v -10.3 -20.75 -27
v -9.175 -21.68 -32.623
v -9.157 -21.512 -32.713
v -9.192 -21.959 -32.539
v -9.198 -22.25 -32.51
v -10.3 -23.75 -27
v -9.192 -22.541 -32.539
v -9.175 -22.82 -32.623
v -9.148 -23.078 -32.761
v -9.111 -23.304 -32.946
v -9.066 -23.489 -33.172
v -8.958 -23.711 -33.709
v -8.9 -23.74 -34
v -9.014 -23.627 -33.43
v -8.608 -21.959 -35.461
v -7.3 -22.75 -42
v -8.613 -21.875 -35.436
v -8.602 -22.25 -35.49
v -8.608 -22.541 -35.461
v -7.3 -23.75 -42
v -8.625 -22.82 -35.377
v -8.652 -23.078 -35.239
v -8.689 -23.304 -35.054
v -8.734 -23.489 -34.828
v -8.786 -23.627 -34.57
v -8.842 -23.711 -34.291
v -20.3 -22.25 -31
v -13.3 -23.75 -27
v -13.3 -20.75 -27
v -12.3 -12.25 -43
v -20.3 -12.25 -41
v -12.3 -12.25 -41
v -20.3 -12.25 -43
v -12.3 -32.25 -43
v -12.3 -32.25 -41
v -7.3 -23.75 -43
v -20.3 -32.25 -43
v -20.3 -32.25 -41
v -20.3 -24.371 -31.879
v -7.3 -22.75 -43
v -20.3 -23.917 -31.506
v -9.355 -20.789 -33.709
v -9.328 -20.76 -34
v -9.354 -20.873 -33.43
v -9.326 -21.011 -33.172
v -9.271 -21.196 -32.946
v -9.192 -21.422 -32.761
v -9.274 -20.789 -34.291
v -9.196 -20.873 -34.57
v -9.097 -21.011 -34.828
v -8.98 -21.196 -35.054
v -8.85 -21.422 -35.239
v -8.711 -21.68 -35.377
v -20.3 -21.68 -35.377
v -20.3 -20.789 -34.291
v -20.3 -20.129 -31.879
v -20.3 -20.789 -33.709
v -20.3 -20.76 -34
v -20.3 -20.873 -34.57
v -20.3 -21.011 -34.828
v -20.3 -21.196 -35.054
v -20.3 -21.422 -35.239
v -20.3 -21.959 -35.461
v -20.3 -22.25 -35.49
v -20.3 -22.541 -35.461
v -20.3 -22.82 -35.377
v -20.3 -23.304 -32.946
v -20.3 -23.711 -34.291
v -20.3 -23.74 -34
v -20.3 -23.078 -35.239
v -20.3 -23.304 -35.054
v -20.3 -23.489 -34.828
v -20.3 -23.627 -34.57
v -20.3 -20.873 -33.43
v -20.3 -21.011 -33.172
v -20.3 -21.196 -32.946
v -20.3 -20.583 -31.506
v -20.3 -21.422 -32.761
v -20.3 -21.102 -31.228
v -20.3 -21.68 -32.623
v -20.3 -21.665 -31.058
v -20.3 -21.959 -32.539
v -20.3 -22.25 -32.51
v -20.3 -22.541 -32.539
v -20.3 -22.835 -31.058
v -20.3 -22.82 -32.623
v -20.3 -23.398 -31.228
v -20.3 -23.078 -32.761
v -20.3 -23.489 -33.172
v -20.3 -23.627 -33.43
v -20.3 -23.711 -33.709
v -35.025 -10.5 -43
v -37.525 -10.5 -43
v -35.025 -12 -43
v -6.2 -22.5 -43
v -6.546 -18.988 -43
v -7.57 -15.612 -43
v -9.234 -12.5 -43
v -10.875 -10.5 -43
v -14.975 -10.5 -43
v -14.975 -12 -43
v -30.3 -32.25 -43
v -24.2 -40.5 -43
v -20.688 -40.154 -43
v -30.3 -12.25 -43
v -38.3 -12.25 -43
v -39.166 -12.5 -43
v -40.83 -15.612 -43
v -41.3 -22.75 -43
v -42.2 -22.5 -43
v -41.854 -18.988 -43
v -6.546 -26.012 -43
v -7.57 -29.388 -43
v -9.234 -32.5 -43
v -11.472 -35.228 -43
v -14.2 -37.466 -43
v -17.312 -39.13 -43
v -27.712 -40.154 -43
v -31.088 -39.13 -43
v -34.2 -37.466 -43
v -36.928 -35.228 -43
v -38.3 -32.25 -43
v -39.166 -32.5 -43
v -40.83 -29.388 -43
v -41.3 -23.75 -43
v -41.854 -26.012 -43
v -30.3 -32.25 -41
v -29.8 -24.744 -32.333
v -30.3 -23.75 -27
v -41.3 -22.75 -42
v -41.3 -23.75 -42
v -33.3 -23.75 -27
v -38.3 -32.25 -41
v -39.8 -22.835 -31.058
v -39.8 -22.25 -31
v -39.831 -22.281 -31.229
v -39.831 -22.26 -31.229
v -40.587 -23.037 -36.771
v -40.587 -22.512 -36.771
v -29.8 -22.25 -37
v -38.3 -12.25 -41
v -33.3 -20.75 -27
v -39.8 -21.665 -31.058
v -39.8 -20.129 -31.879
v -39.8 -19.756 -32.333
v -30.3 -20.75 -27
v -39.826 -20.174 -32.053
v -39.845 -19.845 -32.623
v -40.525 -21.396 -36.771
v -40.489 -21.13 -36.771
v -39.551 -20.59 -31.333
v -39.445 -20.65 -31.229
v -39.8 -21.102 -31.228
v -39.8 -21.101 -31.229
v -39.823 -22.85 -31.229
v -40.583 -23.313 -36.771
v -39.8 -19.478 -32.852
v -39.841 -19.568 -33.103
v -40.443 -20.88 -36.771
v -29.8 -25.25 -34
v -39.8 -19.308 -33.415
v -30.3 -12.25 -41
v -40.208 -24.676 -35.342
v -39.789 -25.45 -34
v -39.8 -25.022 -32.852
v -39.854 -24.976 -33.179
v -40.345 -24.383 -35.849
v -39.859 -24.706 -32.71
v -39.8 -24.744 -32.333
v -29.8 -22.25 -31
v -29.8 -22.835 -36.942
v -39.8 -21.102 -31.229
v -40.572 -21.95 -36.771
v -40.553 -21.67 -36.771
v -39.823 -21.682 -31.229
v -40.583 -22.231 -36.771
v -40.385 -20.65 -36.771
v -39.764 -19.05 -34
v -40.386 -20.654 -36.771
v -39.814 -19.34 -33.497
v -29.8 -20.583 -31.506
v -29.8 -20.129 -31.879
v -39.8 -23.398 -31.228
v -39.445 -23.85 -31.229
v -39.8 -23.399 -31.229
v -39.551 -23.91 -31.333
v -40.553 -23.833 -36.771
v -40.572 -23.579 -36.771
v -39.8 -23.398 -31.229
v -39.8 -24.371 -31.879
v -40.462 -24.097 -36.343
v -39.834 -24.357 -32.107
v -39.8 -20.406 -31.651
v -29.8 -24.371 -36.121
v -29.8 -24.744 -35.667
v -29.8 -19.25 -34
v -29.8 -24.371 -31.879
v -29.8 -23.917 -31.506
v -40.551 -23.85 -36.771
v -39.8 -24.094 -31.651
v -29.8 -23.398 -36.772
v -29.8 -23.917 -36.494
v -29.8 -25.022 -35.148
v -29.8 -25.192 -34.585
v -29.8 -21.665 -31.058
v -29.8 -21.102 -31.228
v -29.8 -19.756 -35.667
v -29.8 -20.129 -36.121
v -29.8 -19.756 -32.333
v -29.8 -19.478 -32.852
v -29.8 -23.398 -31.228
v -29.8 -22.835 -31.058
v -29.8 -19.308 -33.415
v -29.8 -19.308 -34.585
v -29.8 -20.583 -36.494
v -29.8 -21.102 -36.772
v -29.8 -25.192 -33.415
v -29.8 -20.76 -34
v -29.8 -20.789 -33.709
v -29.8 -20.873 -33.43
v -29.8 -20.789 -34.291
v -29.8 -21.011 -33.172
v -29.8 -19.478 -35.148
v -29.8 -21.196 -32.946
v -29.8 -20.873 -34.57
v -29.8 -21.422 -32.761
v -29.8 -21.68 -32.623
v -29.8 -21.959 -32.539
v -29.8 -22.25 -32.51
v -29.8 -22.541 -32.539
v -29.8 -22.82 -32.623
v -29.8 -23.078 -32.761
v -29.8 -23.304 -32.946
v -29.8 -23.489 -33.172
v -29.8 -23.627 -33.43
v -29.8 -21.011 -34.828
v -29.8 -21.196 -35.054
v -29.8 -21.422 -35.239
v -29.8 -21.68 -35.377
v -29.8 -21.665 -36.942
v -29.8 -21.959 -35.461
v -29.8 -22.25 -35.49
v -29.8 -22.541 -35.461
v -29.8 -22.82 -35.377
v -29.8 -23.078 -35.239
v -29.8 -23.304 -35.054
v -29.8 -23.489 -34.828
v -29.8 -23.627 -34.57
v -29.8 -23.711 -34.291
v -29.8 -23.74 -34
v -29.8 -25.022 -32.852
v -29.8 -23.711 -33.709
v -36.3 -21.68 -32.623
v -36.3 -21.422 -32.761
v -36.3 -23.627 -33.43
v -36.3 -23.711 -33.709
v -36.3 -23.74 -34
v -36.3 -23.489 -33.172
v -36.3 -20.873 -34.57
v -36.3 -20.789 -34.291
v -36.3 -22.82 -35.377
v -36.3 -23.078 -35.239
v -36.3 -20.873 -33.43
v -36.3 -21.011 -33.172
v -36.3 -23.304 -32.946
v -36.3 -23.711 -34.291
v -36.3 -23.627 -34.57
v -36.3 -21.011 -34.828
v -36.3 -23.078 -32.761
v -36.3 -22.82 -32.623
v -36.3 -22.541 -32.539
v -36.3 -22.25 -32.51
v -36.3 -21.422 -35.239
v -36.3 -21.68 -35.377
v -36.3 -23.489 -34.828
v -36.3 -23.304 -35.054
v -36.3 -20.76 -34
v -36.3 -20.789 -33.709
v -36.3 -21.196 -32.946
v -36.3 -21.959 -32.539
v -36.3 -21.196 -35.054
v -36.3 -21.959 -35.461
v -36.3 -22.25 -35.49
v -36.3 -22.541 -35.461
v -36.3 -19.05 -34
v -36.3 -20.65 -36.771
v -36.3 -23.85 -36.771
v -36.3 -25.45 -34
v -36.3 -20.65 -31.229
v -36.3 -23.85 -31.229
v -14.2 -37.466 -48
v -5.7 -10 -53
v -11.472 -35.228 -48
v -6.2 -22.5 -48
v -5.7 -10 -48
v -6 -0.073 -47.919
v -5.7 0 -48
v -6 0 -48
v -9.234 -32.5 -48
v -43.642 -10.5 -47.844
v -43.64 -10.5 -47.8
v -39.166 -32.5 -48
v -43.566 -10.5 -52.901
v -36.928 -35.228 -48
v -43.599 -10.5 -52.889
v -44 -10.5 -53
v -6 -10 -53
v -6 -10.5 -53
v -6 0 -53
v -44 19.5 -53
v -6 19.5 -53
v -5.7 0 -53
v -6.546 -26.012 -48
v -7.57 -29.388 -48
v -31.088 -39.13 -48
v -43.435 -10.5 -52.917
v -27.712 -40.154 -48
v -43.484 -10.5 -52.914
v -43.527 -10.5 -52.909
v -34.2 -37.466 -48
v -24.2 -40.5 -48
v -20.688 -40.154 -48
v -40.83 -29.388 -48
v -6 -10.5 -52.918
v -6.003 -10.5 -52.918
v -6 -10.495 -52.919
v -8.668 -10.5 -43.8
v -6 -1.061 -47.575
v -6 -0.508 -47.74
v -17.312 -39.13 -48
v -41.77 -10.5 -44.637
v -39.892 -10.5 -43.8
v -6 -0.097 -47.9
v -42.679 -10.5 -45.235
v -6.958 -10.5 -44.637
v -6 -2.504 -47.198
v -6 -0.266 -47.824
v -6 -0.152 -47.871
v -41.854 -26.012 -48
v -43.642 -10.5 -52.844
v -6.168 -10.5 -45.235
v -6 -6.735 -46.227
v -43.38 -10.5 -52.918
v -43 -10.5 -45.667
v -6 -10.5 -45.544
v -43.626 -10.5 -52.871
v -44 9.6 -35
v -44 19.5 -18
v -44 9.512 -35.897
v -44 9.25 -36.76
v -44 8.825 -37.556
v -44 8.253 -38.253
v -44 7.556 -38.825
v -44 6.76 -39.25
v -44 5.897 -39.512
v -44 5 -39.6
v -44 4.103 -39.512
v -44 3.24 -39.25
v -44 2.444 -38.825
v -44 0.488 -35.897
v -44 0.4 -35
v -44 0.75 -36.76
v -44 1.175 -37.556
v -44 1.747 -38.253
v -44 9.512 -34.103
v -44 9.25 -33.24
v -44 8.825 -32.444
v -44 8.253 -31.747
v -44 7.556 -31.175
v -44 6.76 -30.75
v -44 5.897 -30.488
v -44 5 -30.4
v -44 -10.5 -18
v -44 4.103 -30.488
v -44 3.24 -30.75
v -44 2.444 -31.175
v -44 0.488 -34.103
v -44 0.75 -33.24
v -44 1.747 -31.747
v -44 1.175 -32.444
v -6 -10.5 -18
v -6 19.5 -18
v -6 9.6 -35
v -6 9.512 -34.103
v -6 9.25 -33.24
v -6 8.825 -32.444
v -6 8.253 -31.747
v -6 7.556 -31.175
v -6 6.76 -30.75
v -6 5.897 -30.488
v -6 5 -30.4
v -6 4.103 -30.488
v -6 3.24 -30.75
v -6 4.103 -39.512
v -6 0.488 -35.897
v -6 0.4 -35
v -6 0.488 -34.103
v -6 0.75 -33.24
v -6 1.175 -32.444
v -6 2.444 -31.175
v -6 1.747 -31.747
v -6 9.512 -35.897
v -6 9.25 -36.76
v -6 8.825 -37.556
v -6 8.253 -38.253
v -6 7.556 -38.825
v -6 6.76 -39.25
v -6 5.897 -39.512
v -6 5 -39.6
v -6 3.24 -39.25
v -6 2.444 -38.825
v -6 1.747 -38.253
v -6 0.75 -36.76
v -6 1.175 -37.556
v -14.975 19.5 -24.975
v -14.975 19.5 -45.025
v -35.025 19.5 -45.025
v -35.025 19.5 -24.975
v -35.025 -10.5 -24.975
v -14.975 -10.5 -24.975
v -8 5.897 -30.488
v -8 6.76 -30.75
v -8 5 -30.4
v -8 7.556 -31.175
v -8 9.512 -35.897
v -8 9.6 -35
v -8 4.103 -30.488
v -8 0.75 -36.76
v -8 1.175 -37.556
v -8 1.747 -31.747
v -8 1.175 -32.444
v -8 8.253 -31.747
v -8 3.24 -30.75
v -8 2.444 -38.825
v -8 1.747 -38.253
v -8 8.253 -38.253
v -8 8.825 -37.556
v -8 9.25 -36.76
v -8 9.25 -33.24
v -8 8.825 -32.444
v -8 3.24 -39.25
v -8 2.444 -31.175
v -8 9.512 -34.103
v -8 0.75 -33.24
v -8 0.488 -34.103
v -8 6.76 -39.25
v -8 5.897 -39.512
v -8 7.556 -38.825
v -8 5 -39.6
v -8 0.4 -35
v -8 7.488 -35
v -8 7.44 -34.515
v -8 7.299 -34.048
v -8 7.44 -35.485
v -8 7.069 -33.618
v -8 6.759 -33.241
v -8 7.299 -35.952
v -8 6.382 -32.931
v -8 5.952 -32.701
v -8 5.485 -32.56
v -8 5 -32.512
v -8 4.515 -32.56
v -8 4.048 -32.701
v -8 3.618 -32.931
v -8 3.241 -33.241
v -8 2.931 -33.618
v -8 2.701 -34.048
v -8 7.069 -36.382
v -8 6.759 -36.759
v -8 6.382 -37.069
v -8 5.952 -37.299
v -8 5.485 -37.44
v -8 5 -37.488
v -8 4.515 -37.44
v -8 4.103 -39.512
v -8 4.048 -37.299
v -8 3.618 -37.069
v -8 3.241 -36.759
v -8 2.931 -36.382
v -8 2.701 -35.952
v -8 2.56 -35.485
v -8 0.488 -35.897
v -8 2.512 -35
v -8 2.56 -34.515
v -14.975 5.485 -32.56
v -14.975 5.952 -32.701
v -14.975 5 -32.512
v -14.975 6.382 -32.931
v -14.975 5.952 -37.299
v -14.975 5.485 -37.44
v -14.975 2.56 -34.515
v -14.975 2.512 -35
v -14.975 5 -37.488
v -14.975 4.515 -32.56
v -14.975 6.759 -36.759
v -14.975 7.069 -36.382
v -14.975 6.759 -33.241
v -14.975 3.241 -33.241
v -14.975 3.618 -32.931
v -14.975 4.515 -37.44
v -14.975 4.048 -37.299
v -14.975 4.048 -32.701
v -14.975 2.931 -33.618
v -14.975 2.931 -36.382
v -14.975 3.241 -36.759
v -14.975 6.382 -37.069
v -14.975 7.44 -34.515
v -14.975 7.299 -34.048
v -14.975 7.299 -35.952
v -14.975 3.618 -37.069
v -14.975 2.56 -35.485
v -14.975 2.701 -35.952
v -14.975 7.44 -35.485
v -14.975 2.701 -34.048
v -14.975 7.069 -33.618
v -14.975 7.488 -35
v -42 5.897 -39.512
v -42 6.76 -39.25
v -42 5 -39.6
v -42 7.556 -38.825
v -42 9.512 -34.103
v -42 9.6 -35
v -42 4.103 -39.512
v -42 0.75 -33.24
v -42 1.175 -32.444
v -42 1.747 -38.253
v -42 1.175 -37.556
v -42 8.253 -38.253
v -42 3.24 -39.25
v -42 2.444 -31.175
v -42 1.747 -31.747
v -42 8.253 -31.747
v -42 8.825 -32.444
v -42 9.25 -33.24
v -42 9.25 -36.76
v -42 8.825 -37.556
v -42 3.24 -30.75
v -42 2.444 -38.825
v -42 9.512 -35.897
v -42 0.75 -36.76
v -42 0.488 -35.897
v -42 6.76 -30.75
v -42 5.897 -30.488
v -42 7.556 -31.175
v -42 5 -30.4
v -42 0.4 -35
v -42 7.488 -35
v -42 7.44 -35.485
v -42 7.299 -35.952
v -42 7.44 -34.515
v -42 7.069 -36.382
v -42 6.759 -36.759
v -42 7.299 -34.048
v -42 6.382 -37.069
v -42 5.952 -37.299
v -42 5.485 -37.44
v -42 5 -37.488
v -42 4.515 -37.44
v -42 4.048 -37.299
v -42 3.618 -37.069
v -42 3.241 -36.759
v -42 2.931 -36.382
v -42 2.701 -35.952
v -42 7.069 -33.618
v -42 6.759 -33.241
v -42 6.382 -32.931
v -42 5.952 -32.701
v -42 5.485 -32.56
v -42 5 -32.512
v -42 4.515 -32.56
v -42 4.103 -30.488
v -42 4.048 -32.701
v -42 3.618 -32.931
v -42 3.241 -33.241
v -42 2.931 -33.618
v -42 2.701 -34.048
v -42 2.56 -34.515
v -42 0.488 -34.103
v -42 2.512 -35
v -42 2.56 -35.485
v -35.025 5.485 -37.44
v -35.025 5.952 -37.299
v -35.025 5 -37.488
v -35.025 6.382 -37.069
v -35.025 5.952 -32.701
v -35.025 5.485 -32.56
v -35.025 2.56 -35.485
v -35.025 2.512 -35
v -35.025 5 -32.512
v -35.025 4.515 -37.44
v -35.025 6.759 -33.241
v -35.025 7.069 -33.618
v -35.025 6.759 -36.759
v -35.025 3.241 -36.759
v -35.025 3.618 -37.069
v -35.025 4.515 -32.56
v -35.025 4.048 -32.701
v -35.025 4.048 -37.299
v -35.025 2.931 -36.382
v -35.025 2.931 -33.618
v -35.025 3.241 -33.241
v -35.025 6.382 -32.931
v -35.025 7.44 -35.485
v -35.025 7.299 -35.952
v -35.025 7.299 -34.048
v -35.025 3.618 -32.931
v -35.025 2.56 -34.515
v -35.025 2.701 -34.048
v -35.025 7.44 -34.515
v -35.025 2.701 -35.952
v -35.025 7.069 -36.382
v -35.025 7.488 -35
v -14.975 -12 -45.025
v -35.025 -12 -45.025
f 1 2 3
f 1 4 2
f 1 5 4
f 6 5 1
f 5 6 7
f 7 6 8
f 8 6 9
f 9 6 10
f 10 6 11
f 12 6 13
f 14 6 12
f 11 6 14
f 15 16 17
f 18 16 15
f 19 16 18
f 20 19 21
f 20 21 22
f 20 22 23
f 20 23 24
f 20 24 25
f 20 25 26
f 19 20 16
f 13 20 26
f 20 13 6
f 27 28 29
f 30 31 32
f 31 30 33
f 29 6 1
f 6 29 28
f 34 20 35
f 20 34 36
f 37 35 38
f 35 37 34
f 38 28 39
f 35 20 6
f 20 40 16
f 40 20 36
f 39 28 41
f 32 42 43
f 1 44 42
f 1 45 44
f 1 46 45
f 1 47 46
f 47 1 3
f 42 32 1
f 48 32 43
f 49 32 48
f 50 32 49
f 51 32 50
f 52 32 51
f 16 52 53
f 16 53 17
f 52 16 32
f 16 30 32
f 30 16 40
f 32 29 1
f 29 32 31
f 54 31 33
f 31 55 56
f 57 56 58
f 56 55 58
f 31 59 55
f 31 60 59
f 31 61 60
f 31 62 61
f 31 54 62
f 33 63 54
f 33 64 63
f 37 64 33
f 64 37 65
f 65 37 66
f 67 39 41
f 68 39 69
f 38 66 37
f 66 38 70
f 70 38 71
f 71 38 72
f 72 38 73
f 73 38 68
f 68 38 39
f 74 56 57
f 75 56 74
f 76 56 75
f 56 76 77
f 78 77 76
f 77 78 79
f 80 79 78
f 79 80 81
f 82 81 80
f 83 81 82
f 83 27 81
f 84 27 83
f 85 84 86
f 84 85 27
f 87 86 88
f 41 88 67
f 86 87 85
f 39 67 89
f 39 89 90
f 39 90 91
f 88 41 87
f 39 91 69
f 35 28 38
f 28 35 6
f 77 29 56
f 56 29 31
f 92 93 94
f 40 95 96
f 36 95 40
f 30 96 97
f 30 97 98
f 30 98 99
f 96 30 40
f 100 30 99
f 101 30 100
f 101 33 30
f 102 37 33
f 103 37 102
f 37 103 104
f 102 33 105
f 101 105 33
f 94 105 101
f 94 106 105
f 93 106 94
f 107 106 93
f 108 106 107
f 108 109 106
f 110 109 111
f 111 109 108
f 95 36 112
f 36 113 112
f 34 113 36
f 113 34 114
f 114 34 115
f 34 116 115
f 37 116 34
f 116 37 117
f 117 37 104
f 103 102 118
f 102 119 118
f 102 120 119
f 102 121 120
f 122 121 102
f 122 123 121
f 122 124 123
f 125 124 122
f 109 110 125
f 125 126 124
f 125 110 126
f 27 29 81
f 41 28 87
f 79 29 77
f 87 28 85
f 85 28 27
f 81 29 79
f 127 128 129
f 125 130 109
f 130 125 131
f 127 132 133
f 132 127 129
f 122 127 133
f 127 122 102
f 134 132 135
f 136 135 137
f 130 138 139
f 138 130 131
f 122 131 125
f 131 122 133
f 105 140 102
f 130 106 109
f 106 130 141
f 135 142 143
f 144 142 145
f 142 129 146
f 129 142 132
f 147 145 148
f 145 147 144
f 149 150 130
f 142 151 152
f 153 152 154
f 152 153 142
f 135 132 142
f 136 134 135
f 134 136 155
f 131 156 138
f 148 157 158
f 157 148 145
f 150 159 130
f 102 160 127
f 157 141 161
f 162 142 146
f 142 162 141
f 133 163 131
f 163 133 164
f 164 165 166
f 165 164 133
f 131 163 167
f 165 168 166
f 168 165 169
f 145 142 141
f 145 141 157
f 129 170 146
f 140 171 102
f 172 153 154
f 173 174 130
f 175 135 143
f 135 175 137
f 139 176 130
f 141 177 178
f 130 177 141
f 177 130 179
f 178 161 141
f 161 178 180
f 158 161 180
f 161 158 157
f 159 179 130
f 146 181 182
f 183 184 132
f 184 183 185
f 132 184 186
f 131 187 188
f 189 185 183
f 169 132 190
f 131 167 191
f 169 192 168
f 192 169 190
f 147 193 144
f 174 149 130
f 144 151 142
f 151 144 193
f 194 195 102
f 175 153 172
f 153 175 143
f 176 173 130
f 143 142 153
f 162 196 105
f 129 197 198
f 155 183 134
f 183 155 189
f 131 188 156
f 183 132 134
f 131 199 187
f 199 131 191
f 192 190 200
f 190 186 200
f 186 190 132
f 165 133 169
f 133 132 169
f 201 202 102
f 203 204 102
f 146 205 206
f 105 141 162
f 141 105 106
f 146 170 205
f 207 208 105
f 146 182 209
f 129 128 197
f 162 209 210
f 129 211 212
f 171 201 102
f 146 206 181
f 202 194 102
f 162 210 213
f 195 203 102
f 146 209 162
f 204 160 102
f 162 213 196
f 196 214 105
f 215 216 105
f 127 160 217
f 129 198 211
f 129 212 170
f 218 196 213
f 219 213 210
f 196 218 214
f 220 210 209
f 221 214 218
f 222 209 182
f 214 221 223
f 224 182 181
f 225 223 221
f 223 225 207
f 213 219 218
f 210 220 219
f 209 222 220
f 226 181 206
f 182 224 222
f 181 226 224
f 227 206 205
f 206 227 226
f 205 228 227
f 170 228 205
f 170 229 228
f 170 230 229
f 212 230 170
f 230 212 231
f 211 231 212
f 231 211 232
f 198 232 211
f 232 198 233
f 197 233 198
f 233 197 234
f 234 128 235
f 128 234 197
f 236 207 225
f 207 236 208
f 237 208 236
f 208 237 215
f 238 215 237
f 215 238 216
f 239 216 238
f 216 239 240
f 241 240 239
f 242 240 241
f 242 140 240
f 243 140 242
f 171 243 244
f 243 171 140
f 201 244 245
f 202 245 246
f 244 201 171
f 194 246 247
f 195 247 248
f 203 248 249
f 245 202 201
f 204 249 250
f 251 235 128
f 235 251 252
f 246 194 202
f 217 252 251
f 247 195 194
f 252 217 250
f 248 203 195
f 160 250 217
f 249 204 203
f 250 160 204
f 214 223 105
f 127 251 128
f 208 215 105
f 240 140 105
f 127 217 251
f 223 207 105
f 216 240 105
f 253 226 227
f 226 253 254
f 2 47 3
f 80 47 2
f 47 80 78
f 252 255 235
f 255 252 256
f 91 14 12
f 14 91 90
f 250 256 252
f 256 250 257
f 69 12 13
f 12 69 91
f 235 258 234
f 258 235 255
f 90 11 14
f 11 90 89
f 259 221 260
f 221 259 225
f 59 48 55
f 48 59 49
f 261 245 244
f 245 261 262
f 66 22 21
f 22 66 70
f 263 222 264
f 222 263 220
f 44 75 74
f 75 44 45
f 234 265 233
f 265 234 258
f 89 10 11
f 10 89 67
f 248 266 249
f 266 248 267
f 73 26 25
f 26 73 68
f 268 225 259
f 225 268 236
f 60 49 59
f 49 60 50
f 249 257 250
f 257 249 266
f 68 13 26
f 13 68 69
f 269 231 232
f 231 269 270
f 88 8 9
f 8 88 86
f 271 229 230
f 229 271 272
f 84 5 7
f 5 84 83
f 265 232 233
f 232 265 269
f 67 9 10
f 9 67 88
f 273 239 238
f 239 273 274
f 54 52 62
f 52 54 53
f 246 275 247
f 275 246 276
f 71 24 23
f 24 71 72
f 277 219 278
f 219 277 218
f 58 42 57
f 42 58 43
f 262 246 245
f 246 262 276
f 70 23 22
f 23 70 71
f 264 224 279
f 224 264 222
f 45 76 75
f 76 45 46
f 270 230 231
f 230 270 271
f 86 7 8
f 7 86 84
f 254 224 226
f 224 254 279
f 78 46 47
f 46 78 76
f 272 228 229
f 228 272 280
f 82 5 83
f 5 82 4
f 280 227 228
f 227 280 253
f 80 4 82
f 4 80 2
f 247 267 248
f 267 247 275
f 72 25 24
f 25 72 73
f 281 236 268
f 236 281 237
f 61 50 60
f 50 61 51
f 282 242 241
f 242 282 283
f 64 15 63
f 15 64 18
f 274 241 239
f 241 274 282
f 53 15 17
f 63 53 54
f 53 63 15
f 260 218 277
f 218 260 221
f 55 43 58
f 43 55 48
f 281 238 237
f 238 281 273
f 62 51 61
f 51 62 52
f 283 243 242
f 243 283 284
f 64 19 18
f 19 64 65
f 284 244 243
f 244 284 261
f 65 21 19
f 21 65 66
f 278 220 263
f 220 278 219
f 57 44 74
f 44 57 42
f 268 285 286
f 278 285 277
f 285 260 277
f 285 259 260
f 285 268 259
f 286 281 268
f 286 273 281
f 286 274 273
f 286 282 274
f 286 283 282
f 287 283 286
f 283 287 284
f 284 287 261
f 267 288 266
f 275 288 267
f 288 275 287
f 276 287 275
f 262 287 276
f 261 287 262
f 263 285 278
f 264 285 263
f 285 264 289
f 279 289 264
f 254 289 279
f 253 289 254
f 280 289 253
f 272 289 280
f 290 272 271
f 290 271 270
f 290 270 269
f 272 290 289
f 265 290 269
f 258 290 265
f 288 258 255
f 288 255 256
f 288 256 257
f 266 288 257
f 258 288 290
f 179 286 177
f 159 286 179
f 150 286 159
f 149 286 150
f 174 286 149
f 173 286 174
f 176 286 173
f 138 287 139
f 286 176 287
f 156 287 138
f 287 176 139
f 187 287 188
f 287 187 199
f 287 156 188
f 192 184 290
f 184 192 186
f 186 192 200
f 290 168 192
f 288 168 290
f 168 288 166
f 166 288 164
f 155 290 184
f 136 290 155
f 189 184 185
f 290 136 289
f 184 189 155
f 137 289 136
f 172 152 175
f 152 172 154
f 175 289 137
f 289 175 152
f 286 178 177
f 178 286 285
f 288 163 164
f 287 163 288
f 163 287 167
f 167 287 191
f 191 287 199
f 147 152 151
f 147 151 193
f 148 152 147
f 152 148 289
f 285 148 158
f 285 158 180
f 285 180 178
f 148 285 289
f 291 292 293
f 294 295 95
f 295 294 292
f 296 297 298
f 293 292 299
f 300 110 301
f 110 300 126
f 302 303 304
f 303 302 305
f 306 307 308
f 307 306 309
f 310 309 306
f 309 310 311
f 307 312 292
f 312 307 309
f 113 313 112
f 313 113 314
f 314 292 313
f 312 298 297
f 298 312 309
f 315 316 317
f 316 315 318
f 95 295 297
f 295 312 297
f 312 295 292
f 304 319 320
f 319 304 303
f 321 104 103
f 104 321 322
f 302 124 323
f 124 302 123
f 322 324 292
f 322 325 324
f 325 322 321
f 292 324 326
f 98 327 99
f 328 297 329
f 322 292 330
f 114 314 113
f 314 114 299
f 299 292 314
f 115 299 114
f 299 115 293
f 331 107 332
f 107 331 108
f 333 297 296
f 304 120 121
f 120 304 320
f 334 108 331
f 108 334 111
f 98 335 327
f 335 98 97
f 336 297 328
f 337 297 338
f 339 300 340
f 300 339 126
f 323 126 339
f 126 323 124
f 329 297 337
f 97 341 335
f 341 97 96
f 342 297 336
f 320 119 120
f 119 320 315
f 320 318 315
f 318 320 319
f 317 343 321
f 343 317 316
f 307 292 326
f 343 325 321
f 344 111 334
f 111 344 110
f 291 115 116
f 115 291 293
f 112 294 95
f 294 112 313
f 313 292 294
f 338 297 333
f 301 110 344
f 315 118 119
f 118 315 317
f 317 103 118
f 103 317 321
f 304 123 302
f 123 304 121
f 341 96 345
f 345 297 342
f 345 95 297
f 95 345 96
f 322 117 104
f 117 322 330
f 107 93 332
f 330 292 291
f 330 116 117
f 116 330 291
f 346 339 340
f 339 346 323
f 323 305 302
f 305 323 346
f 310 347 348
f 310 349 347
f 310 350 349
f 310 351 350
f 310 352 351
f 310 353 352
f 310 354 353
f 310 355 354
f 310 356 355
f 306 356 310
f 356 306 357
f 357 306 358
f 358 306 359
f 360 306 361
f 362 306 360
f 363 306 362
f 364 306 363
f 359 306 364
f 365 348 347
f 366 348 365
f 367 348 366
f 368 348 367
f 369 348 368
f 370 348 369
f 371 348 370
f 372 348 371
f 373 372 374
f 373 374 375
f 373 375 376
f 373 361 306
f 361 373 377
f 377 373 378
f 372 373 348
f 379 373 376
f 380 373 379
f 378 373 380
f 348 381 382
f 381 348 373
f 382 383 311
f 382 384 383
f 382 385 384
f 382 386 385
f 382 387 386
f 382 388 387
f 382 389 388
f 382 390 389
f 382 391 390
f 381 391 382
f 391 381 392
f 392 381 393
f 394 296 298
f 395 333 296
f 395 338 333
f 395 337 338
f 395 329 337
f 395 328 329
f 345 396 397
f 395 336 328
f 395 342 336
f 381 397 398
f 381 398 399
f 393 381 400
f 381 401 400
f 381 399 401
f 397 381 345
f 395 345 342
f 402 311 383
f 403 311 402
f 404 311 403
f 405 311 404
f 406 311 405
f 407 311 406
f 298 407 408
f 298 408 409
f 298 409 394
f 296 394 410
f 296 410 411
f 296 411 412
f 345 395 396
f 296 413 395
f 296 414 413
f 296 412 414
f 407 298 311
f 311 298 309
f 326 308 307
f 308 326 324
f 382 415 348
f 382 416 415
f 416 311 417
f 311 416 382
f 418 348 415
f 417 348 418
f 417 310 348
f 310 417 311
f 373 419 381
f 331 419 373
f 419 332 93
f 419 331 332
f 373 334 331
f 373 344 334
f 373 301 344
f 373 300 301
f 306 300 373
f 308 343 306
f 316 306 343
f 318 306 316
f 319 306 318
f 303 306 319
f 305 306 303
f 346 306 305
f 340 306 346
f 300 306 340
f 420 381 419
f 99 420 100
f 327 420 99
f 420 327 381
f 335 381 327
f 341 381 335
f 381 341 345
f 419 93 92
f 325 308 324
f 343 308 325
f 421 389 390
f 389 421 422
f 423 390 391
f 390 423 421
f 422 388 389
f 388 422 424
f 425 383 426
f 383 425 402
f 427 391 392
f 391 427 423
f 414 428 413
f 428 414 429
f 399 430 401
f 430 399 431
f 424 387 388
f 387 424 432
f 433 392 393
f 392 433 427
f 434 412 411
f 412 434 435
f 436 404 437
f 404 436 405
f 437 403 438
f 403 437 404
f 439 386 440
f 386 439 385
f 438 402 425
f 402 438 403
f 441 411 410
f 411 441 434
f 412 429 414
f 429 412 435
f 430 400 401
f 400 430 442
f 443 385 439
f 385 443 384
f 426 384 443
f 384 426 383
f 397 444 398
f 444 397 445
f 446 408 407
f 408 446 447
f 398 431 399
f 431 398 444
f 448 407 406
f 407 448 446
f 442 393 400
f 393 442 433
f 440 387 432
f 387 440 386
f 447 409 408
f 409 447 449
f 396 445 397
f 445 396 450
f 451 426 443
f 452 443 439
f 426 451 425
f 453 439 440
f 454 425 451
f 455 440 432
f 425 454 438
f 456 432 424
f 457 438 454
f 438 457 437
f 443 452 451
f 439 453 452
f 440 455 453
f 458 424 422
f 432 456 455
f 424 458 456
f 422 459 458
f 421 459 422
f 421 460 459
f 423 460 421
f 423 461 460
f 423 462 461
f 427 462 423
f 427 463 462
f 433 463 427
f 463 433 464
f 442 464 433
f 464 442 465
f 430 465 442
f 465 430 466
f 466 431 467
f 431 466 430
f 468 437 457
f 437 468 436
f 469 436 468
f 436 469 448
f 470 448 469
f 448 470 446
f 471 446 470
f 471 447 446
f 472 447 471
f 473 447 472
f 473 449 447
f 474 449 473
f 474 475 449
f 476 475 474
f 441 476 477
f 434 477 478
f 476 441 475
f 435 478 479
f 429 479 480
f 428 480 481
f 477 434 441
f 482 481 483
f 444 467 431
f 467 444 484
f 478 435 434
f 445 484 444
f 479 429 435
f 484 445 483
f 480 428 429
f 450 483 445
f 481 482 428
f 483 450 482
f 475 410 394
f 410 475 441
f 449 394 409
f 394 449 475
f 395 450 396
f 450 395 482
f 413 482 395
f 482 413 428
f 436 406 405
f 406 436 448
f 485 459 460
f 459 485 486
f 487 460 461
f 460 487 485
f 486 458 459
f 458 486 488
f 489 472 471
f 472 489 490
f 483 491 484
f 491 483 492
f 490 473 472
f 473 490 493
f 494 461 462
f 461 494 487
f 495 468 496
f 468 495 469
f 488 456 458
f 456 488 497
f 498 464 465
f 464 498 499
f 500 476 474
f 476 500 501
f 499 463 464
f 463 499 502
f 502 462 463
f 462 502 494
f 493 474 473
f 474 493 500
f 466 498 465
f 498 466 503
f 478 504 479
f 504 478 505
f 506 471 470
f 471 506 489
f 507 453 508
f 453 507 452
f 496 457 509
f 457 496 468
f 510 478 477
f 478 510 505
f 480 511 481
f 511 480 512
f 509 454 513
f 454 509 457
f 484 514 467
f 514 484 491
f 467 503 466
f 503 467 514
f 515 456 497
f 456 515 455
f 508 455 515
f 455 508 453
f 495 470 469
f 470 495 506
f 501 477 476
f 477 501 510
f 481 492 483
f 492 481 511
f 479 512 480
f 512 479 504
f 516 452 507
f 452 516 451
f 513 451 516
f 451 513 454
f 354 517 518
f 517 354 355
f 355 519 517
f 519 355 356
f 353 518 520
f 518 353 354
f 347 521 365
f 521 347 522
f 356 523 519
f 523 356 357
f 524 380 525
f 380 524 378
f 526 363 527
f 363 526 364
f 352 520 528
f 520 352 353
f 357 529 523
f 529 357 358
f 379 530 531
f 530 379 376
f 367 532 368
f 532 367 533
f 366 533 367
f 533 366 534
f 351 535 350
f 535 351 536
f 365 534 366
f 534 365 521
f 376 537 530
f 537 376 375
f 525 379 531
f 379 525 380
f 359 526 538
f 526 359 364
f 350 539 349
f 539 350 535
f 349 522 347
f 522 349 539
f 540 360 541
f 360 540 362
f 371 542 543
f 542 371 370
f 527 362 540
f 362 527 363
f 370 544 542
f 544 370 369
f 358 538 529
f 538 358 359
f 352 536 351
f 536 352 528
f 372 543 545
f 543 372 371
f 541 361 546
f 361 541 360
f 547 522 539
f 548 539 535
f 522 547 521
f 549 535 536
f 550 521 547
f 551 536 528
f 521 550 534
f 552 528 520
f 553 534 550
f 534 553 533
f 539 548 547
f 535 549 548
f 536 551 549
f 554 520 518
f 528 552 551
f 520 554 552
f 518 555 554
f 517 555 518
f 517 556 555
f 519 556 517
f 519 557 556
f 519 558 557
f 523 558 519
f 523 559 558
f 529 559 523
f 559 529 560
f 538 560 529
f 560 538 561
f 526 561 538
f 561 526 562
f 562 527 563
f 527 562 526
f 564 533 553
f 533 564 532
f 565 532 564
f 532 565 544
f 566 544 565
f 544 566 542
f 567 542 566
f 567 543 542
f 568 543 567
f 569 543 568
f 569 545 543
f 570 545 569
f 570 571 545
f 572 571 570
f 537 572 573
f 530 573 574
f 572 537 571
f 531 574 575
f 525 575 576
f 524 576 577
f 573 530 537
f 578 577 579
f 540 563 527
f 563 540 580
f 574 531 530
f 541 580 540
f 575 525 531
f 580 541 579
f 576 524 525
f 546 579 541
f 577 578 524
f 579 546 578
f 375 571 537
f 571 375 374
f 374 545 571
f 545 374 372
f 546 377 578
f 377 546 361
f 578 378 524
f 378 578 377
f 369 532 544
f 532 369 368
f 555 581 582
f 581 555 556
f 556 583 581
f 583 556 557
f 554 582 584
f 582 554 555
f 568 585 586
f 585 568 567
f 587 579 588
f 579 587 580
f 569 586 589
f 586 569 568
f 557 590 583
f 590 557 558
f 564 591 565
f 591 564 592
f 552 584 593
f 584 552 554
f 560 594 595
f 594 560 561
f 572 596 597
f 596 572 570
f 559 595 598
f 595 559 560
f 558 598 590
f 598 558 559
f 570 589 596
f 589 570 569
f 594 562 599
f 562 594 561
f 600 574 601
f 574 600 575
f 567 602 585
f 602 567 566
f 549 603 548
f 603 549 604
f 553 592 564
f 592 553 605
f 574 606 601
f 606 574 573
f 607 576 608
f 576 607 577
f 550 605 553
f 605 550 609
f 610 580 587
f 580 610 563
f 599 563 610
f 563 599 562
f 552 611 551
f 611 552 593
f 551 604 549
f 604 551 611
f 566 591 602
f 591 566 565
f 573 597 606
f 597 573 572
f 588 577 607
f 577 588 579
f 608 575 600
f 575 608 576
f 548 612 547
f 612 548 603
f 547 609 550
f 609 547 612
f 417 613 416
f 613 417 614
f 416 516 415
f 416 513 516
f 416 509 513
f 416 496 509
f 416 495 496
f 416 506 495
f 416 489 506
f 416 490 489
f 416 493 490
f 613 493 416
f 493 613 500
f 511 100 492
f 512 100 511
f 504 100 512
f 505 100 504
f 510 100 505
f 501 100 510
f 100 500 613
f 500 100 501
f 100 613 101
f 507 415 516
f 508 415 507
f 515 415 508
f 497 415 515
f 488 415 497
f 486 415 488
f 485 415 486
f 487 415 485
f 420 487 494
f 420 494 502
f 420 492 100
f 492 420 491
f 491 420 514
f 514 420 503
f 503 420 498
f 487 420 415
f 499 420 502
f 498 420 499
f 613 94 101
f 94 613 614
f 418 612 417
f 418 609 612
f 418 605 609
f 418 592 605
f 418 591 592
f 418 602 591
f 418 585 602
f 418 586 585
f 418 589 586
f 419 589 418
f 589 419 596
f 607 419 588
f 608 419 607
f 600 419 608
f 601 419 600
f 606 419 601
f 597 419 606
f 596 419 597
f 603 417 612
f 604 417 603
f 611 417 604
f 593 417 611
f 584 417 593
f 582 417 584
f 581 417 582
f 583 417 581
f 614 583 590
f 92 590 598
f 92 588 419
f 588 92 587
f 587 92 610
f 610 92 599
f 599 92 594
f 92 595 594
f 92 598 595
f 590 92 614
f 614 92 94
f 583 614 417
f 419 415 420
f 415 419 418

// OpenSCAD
// file: MCAD/constants.scad
// MIT license


TAU = 6.2831853071; //2*PI, see http://tauday.com/
PI = TAU/2;

// translates a imperial measurement in inches to meters
mm_per_inch = 25.4;
// file: MCAD/math.scad
// MIT license

include <constants.scad>

function deg(angle) = 360*angle/TAU;
// file: MCAD/motors.scad
// Copyright 2010 D1plo1d

// This library is dual licensed under the GPL 3.0 and the GNU Lesser General Public License as per http://creativecommons.org/licenses/LGPL/2.1/ .

include <math.scad>


//generates a motor mount for the specified nema standard #.
module stepper_motor_mount(nema_standard,slide_distance=0, mochup=true, tolerance=0) {
	//dimensions from:
	// http://www.numberfactory.com/NEMA%20Motor%20Dimensions.htm
	if (nema_standard == 17)
	{
		_stepper_motor_mount(
			motor_shaft_diameter = 0.1968*mm_per_inch,
			motor_shaft_length = 0.945*mm_per_inch,
			pilot_diameter = 0.866*mm_per_inch,
			pilot_length = 0.80*mm_per_inch,
			mounting_bolt_circle = 1.725*mm_per_inch,
			bolt_hole_size = 3.5,
			bolt_hole_distance = 1.220*mm_per_inch,
			slide_distance = slide_distance,
			mochup = mochup,
			tolerance=tolerance);
	}
	if (nema_standard == 23)
	{
		_stepper_motor_mount(
			motor_shaft_diameter = 0.250*mm_per_inch,
			motor_shaft_length = 0.81*mm_per_inch,
			pilot_diameter = 1.500*mm_per_inch,
			pilot_length = 0.062*mm_per_inch,
			mounting_bolt_circle = 2.625*mm_per_inch,
			bolt_hole_size = 0.195*mm_per_inch,
			bolt_hole_distance = 1.856*mm_per_inch,
			slide_distance = slide_distance,
			mochup = mochup,
			tolerance=tolerance);
	}
	
}


//inner mehod for creating a stepper motor mount of any dimensions
module _stepper_motor_mount(
	motor_shaft_diameter,
	motor_shaft_length,
	pilot_diameter,
	pilot_length,
	mounting_bolt_circle,
	bolt_hole_size,
	bolt_hole_distance,
	slide_distance = 0,
	motor_length = 40, //arbitray - not standardized
	mochup,
	tolerance = 0
)
{
	union()
	{
	// == centered mount points ==
	//mounting circle inset
	translate([0,slide_distance/2,0]) circle(r = pilot_diameter/2 + tolerance);
	square([pilot_diameter,slide_distance],center=true);
	translate([0,-slide_distance/2,0]) circle(r = pilot_diameter/2 + tolerance);

	//todo: motor shaft hole
	
	//mounting screw holes
	for (x = [-1,1])
	{
		for (y = [-1,1])
		{
			translate([x*bolt_hole_distance/2,y*bolt_hole_distance/2,0])
			{
				translate([0,slide_distance/2,0]) circle(bolt_hole_size/2 + tolerance);
				translate([0,-slide_distance/2,0]) circle(bolt_hole_size/2 + tolerance);
				square([bolt_hole_size+2*tolerance,slide_distance],center=true);
			}
		}
	}
	// == motor mock-up ==
	//motor box
	if (mochup == true)
	{
		%translate([0,0,-5]) cylinder(h = 5, r = pilot_diameter/2);
		%translate(v=[0,0,-motor_length/2])
		{
			cube(size=[bolt_hole_distance+bolt_hole_size+5,bolt_hole_distance+bolt_hole_size+5,motor_length], center = true);
		}
		//shaft
		%translate(v=[0,0,-(motor_length-motor_shaft_length-2)/2])
		{
			%cylinder(r=motor_shaft_diameter/2,h=motor_length+motor_shaft_length--1, center = true);
		}
	}
	}
}
// file: triangle.scad
//Copyright Austin Floyd 2013
//http://www.thingiverse.com/thing:119050
//license GNU GPL
//austin.floyd at 3DprintGeeks (dot) com

//global variables.. if not set when calling wedge it will use these values. 
//The prefix st_ is to "namespace" the global variables so they're not accidentally overridden elsewhere


//The top angle of the right triangle
st_wedgeAngle=12; // [0.01:89.99]

//The height of the triangle (width auto-generated based on this)
st_wedgeHeight=27; // [0.01:200]

//Depth (thickness) of triangle
st_wedgeWidth=2.2; // [0.01:200]

//Increased or decreased percentage (50% would be 0.5) of top point vs bottom point
st_topFactor=0.5; // [0,0.1,0.2,0.3,0.4,0.5,0.6,0.7,0.8,0.9,1]

//Whether or not to center on x/y/z
st_center=false; // [true, false]

//Flip it upside down
st_invert=false; // [true, false]

//default wedge
//wedge();

//demo of several different wedges
demo();

module demo() {
	translate([0,0,15])
	wedge(angle=75,height=10, wedgeWidth=5);

	wedge(angle=75,height=5,topFactor=.25, center=true, wedgeWidth=10);

	translate([0,0,-15])
	wedge(angle=35,height=13,center=true);

	translate([0,0,-30])
	wedge(angle=35,height=6, center=true, invert=true);
}


module wedge(angle=st_wedgeAngle, height=st_wedgeHeight, wedgeWidth=st_wedgeWidth, topFactor=st_topFactor, center=st_center, invert=st_invert) {
	angle2=180-90-angle;
	hyp=height/sin(angle2);
	width=sqrt(pow(hyp,2)-pow(height,2));
	if (!invert) {
		triangle(height, width, center, topFactor, wedgeWidth);
	}
	if (invert) {
		rotate(180,[1,0,0])
		triangle(height, width, center, topFactor, wedgeWidth);
	}
}
module triangle(height=5, width=5, center=false, topFactor=0.5, wedgeWidth) {
	triangles=[[0,1,4],[5,4,1],		// top
					[1,2,5],[2,3,4],		// sides
					[3,0,4], [4,5,2],	//back
           	[2,1,0], [2,0,3]]; // base
	halfWidth=width/2;
	halfWWidth=wedgeWidth/2;
	topWidth=wedgeWidth*topFactor;
	halfTopWidth=topWidth/2;
	topHalfDiff=(wedgeWidth-topWidth)/2;
	halfHeight=height/2;
	if (center) {
		polyhedron(
  			points=[/*0*/[halfWidth,halfWWidth,-halfHeight],/*1*/[halfWidth,-halfWWidth,-halfHeight],				//front point
					  /*2*/[-halfWidth,-halfWWidth,-halfHeight],       /*3*/[-halfWidth,halfWWidth,-halfHeight], //rear point
           	  /*4*/[-halfWidth,halfTopWidth,height-halfHeight], /*5*/[-halfWidth,-halfTopWidth,height-halfHeight] ], //front/rear top 
  			triangles=triangles
		);
	}
	else {
		polyhedron(
  			points=[/*0*/[width,wedgeWidth,0],         			 /*1*/[width,0,0],				    ////front point
					  /*2*/[0,0,0],       					  			 /*3*/[0,wedgeWidth,0], 		    //rear point
           	  /*4*/[0,wedgeWidth-topHalfDiff,height],/*5*/[0,topHalfDiff,height] ],//front/back top 
  			triangles=triangles
		);
	}
}
// file: pulley.scad
use <MCAD/nuts_and_bolts.scad>;

module pulley_wall(xside)
{
    hull(){
       translate([0,0,0]) cube([20,8,2]);
       
       if (xside==0){
          translate([8.5,0,14]) cube([3,3,2]);
          translate([8.5,10,0]) cube([1,1,1]);
          translate([10,9.5,9]) rotate([90,0,0]) cylinder(r=3,h=10);
          
         } else {
          translate([8.5,-2,14]) cube([3,3,2]);
          translate([8.5,-5,0]) cube([1,1,1]);
          translate([10,8,9]) rotate([90,0,0]) cylinder(r=3,h=10);
         }
       }
    
}

module pulley_body()
{
    translate([0,4,0])   pulley_wall(1);
    translate([0,22,0])  pulley_wall(0);
    %translate([10,2.2,9]) rotate([90,0,180]) boltHole(3,length=45);
    %translate([10,27,9]) rotate([90,0,180]) nutHole(3); 
}

module pulley_cuts()
{
    translate([10,-2,9]) rotate([90,0,180]) boltHole(3,length=45);
    translate([10,28,9]) rotate([90,0,180]) nutHole(3);  
    translate([10,30,9]) rotate([90,0,180]) nutHole(3); 
}

module pulley()
{
	difference(){
        translate([23,21,-12]) rotate([90,0,270]) pulley_body();
        translate([23,21,-12]) rotate([90,0,270]) pulley_cuts();
        }
    

}



pulley();
// file: sensor.scad
module sensor_mount_body()
{
 union() { 
      translate([44,2,0]) rotate([90,0,0]) cube([10,15,4]); 
      translate([44,18,0]) rotate([90,0,0]) cube([10,15,4]);
      
      translate([50,-2,0]) rotate([90,0,90]) cube([20,15,4]);
    //  translate([0,-2,0]) rotate([90,0,90]) cube([20,15,4]);
      
      
      }
}

module sensor_mount_cuts()
{

      translate([50,7.5,7.5]) rotate([90, 0, 90]) cylinder(r=2.5, h=10, center=true, $fn=12);

}

module sensor_mount()
{
   difference() {
    sensor_mount_body();
    sensor_mount_cuts();
    
     
     }
}

sensor_mount();
// file: nemamount.scad
include <MCAD/units.scad>;
include <MCAD/materials.scad>
include <MCAD/stepper.scad>
include <MCAD/motors.scad>
use <MCAD/shapes.scad>;
use <pulley.scad>;
$fn = 32;




module motor_support(ht)
{
   difference(){
	  translate([-22.5,23.5,0]) rotate([90,0,0]) motor_support_body(ht);
      translate([0,1,0]) rotate([90,0,0]) motor_support_cuts(ht);
      }
}

module motor_support_body(ht)
{
	cube([45,ht,48.5]);

}


module motor_support_cuts(ht)
{
// Motor shaft/pulley cutout.
      translate([0,.1,0]) rotate([90, 0, 0]) cylinder(r=12, h=ht*2, center=true, $fn=60);
      // NEMA 17 stepper motor mounting screws.
      for (x = [-1, 1]) for (z = [-1, 1]) {
        scale([x, 1, z]) translate([15.5, .1, 15.5]) {
          rotate([90, 0, 0]) cylinder(r=4, h=ht*2, center=true, $fn=12);
          }
        }
}



module nema_geared_cutout()
{
    //pulley opening
    translate([16,1,21]) rotate([90,0,0]){
      cylinder (h=22, r=6.6);

      rotate([0,0,45]) {
        translate([14,0,0]) cylinder(h=22, r=1.6, $fn=12);
        translate([0,14,0]) cylinder(h=22, r=1.6, $fn=12);
        translate([-14,0,0]) cylinder(h=22, r=1.6, $fn=12);
        translate([0,-14,0]) cylinder(h=22, r=1.6, $fn=12);
      }
     
    }

    //gearhead indentation
    translate([16,-5,21]) rotate([90,0,0]) cylinder (h=3.35, r=11.25);

  
    
}

module nema_cutout()
{
// Motor shaft/pulley cutout.
      rotate([90, 0, 0]) cylinder(r=12, h=20, center=true, $fn=60);
      // NEMA 17 stepper motor mounting screws.
      for (x = [-1, 1]) for (z = [-1, 1]) {
        scale([x, 1, z]) translate([15.5, -5, 15.5]) {
          rotate([90, 0, 0]) cylinder(r=1.65, h=20, center=true, $fn=12);
          }
        }
}

module nema_motor()
{
   union(){
     nema_mount();
     %translate([0,-4,1]) rotate([90,0,0]) motor(Nema17, size=NemaLong , dualAxis=false);
     }
}

module nema_motor_inverse()
{
   union(){
     nema_mount_inverse();
     %translate([0,-4,1]) rotate([90,0,0]) motor(Nema17, size=NemaLong , dualAxis=false);
     }
}

module nema_geared_motor_inverse()
{
   union(){
     nema_geared_inverse();
     %translate([16,-7,22]) rotate([90,0,180]) motor(Nema17, NemaLong, dualAxis=false);
    
     }
}

module nema_geared_motor()
{
   union(){
     nema_geared_mount();
     %translate([16,-7,22]) rotate([90,0,180]) motor(Nema17, NemaLong, dualAxis=false);
    
     }
}

module nema_geared_mount()
{
   difference(){
      union(){
           translate([-6,-6,0]) rotate([90,0,0]) cube([45,45,7]);
           rotate([180,0,0]) translate([-6,6,-4]) cube([45,15,5]);
           rotate([180,0,0]) translate([-6,6,-44])  cube([45,15,5]);
           }
      translate([0,0,1]) nema_geared_cutout();
      }
}

module nema_geared_inverse()
{
   difference(){
      union(){
           translate([-6,-6,0]) rotate([90,0,0]) cube([45,45,7]);
           translate([-6,-31,-4]) rotate([0,0,0]) cube([45,25,5]);
           translate([-6,-31,44]) rotate([0,0,0]) cube([45,25,5]);
           }
      translate([0,0,1]) nema_geared_cutout();
      }


}

module nema_mount_inverse()
{
   difference(){
      union(){
        translate([-22.5,0,-21.5]) rotate([90,0,0]) cube([45,45,5]);
        translate([-22.5,-5,-25]) rotate([0,0,0]) cube([45,25,5]);
        }
      translate([0,0,1]) nema_cutout();
      }
   //nema_cutout();
}

module nema_mount()
{
   difference(){
      union(){
        translate([-22.5,0,-21.5]) rotate([90,0,0]) cube([45,45,5]);
        rotate([180,0,0]) translate([-22.5,-10,-28]) cube([45,15,5]);
        }
      translate([0,0,1]) nema_cutout();
      }
   //nema_cutout();
}

module pulley_mount()
{
      hull(){
        translate([-22.5,0,-21.5+3]) rotate([90,0,0]) cube([10,38,5]);
	translate([0,5,0]) rotate([90,0,0]) cylinder(r=18,h=5);
      }
	translate([-11.25,28,-3.9]) rotate([0,0,-90]) pulley();
          
}

//nema_motor();
//nema_motor_inverse();
//translate([0,0,40]) rotate([270,0,0]) pulley_mount();
//translate([0,0,0]) motor_support(40);
//nema_geared_motor();
//nema_geared_motor_inverse();
pulley_mount();
// file: vslot.scad
include <MCAD/units.scad>;
include <MCAD/materials.scad>
use <MCAD/shapes.scad>;
use <bom.scad>;

vslot_color_black = [0.27, 0.27, 0.3];
vslot_color = Aluminum;

module vslot(length=50, sections=1, finish, cutout=0) {
	size = sections * 20;
	bom(str("vslot20x", size, "x", length), str("v-slot 20x", size, " (", length , "mm)"), ["rail", "extrusion", "structure"]);
	cutext = [[12.00,4.50],[10.00,4.50],[8.20,2.78],[8.20,5.50],[6.56,5.50],[3.90,2.84],[3.90,0.21],[3.69,0.00],[3.90,-0.21],[3.90,-2.84],[6.56,-5.50],[8.20,-5.50],[8.20,-2.78],[10.00,-4.50],[12.00,-4.50]];
	cutint = [[16.10,0.21],[16.10,2.84],[12.70,6.24],[12.70,8.78],[7.30,8.78],[7.30,6.24],[3.90,2.84],[3.90,0.21],[3.69,0.00],[3.90,-0.21],[3.90,-2.84],[7.30,-6.24],[7.30,-8.78],[12.70,-8.78],[12.70,-6.24],[16.10,-2.84],[16.10,-0.21],[16.31,0.00],];
	cutcorner = [[8.20,8.20],[6.57,8.20],[6.57,7.66],[7.66,6.57],[8.20,6.57]];

	module profile() {
        
		difference() {
         
			translate([0,0,length/2])
			roundedBox(20 * sections, 20, length, 1.5);
         if (cutout == 0){
			for(i = [0,180]) rotate([0,0,-i]) translate([10 * (sections - 1), 0, -epsilon/2]) {
				linear_extrude(length+20) polygon(cutext);
				translate([5,-2.89,-20]) cube([10,5.78,length+40]);
			}
          
			for(i = [90,270]) rotate([0,0,-i])
				for(j = [0:sections-1]) translate([0, (sections - 1) * 10 - 20 * j, -epsilon/2]) {
					linear_extrude(length+epsilon) polygon(cutext);
					translate([5,-2.89,-20]) cube([10,5.78,length+40]);
				}

			for(i = [0:sections-1]) translate([i * 20 - 10 * (sections - 1),0,-epsilon/2])
				cylinder(length+20, 2.1, 2.1);

			for(i = [90,270]) rotate([0,0,-i])
				translate([0,(sections - 1) * 10,-epsilon/2])
				linear_extrude(length+epsilon) polygon(cutcorner);
			for(i = [ 0,180]) rotate([0,0,-i])
				translate([(sections - 1) * 10,0,-epsilon/2])
				linear_extrude(length+epsilon) polygon(cutcorner);

			if(sections > 1)
				for(i = [0:sections-2]) translate([(sections - 3) * 10 - i * 20, 0, -epsilon/2])
					linear_extrude(length+epsilon) polygon(cutint);
                      }
		}
	}

      if (cutout == 1){
		 translate([0,0,length/2]) box((20 * sections)+.05, 20.05, length);
          } else {
	     if(finish)
		   color(finish) profile();
	     else
		   color(vslot_color) profile();
         }
}

module vslot20x20(length, finish) { vslot(length, 1, finish); }
module vslot20x20_cutout(length, finish) { vslot(length, 1, finish, 1); }


module vslot20x40(length, finish) { vslot(length, 2, finish); }
module vslot20x40_cutout(length, finish) { vslot(length, 2, finish, 1); }

module vslot20x60(length, finish) { vslot(length, 3, finish); }
module vslot20x60_cutout(length, finish) { vslot(length, 3, finish, 1); }

module vslot20x80(length, finish) { vslot(length, 4, finish); }
module vslot20x80_cutout(length, finish) { vslot(length, 4, finish, 1); }


module vslot_test() {
	$fn = 32;

	vslot20x20(100);

	translate([0, 40, 0])
	vslot20x40(100, vslot_color_black);

	translate([0, 80, 0])
	vslot20x60(100);

	translate([0, 120, 0])
	vslot20x80(100, vslot_color_black);

    translate([0,140,0]) vslot20x20_cutout(100);
}

vslot_test();
// file: bom.scad
module bom(code, desc, category) {
	echo(str("BOM: ",code," - ", desc, "; ", category));
}
// file: MCAD/nuts_and_bolts.scad
// Copyright 2010 D1plo1d

// This library is dual licensed under the GPL 3.0 and the GNU Lesser General Public License as per http://creativecommons.org/licenses/LGPL/2.1/ .

//testNutsAndBolts();

module SKIPtestNutsAndBolts()
{
	$fn = 360;
	translate([0,15])nutHole(3, proj=2);
	boltHole(3, length= 30, proj=2);
}

MM = "mm";
INCH = "inch"; //Not yet supported

//Based on: http://www.roymech.co.uk/Useful_Tables/Screws/Hex_Screws.htm
METRIC_NUT_AC_WIDTHS =
[
	-1, //0 index is not used but reduces computation
	-1,
	-1,
	6.40,//m3
	8.10,//m4
	9.20,//m5
	11.50,//m6
	-1,
	15.00,//m8
	-1,
	19.60,//m10
	-1,
	22.10,//m12
	-1,
	-1,
	-1,
	27.70,//m16
	-1,
	-1,
	-1,
	34.60,//m20
	-1,
	-1,
	-1,
	41.60,//m24
	-1,
	-1,
	-1,
	-1,
	-1,
	53.1,//m30
	-1,
	-1,
	-1,
	-1,
	-1,
	63.5//m36
];
METRIC_NUT_THICKNESS =
[
	-1, //0 index is not used but reduces computation
	-1,
	-1,
	2.40,//m3
	3.20,//m4
	4.00,//m5
	5.00,//m6
	-1,
	6.50,//m8
	-1,
	8.00,//m10
	-1,
	10.00,//m12
	-1,
	-1,
	-1,
	13.00,//m16
	-1,
	-1,
	-1,
	16.00//m20
	-1,
	-1,
	-1,
	19.00,//m24
	-1,
	-1,
	-1,
	-1,
	-1,
	24.00,//m30
	-1,
	-1,
	-1,
	-1,
	-1,
	29.00//m36
];

COURSE_METRIC_BOLT_MAJOR_THREAD_DIAMETERS =
[//based on max values
	-1, //0 index is not used but reduces computation
	-1,
	-1,
	2.98,//m3
	3.978,//m4
	4.976,//m5
	5.974,//m6
	-1,
	7.972,//m8
	-1,
	9.968,//m10
	-1,
	11.966,//m12
	-1,
	-1,
	-1,
	15.962,//m16
	-1,
	-1,
	-1,
	19.958,//m20
	-1,
	-1,
	-1,
	23.952,//m24
	-1,
	-1,
	-1,
	-1,
	-1,
	29.947,//m30
	-1,
	-1,
	-1,
	-1,
	-1,
	35.940//m36
];

module nutHole(size, units=MM, tolerance = +0.0001, proj = -1)
{
	//takes a metric screw/nut size and looksup nut dimensions
	radius = METRIC_NUT_AC_WIDTHS[size]/2+tolerance;
	height = METRIC_NUT_THICKNESS[size]+tolerance;
	if (proj == -1)
	{
		cylinder(r= radius, h=height, $fn = 6, center=[0,0]);
	}
	if (proj == 1)
	{
		circle(r= radius, $fn = 6);
	}
	if (proj == 2)
	{
		translate([-radius/2, 0])
			square([radius*2, height]);
	}
}

module boltHole(size, units=MM, length, tolerance = +0.0001, proj = -1)
{
	radius = COURSE_METRIC_BOLT_MAJOR_THREAD_DIAMETERS[size]/2+tolerance;
//TODO: proper screw cap values
	capHeight = METRIC_NUT_THICKNESS[size]+tolerance; //METRIC_BOLT_CAP_HEIGHTS[size]+tolerance;
	capRadius = METRIC_NUT_AC_WIDTHS[size]/2+tolerance; //METRIC_BOLT_CAP_RADIUS[size]+tolerance;

	if (proj == -1)
	{
	translate([0, 0, -capHeight])
		cylinder(r= capRadius, h=capHeight);
	cylinder(r = radius, h = length);
	}
	if (proj == 1)
	{
		circle(r = radius);
	}
	if (proj == 2)
	{
		translate([-capRadius/2, -capHeight])
			square([capRadius*2, capHeight]);
		square([radius*2, length]);
	}
}
// file: MCAD/shapes.scad
/*
 *  OpenSCAD Shapes Library (www.openscad.org)
 *  Copyright (C) 2009  Catarina Mota
 *  Copyright (C) 2010  Elmo Mäntynen
 *
 *  License: LGPL 2.1 or later
*/

// 2D Shapes
//ngon(sides, radius, center=false);

// 3D Shapes
//box(width, height, depth);
//roundedBox(width, height, depth, factor);
//cone(height, radius);
//ellipticalCylinder(width, height, depth);
//ellipsoid(width, height);
//tube(height, radius, wall, center = false);
//tube2(height, ID, OD, center = false);
//ovalTube(width, height, depth, wall, center = false);
//hexagon(height, depth);
//octagon(height, depth);
//dodecagon(height, depth);
//hexagram(height, depth);
//rightTriangle(adjacent, opposite, depth);
//equiTriangle(side, depth);
//12ptStar(height, depth);

//----------------------

// size is a vector [w, h, d]
module box(width, height, depth) {
  cube([width, height, depth], true);
}

// size is a vector [w, h, d]
module roundedBox(width, height, depth, radius) {
  size=[width, height, depth];
  cube(size - [2*radius,0,0], true);
  cube(size - [0,2*radius,0], true);
  for (x = [radius-size[0]/2, -radius+size[0]/2],
       y = [radius-size[1]/2, -radius+size[1]/2]) {
    translate([x,y,0]) cylinder(r=radius, h=size[2], center=true);
  }
}

module cone(height, radius, center = false) {
  cylinder(height, radius, 0, center);
}

module ellipticalCylinder(w,h, height, center = false) {
  scale([1, h/w, 1]) cylinder(h=height, r=w, center=center);
}

module ellipsoid(w, h, center = false) {
  scale([1, h/w, 1]) sphere(r=w/2, center=center);
}

// wall is wall thickness
module tube(height, radius, wall, center = false) {
  difference() {
    cylinder(h=height, r=radius, center=center);
    cylinder(h=height, r=radius-wall, center=center);
  }
}

// wall is wall thickness
module tube2(height, ID, OD, center = false) {
  difference() {
    cylinder(h=height, r=OD/2, center=center);
    cylinder(h=height, r=ID/2, center=center);
  }
}

// wall is wall thickness
module ovalTube(height, rx, ry, wall, center = false) {
  difference() {
    scale([1, ry/rx, 1]) cylinder(h=height, r=rx, center=center);
    scale([(rx-wall)/rx, (ry-wall)/rx, 1]) cylinder(h=height, r=rx, center=center);
  }
}

// size is the XY plane size, height in Z
module hexagon(size, height) {
  boxWidth = size/1.75;
  for (r = [-60, 0, 60]) rotate([0,0,r]) cube([boxWidth, size, height], true);
}

// size is the XY plane size, height in Z
module octagon(size, height) {
  intersection() {
    cube([size, size, height], true);
    rotate([0,0,45]) cube([size, size, height], true);
  }
}

// size is the XY plane size, height in Z
module dodecagon(size, height) {
  intersection() {
    hexagon(size, height);
    rotate([0,0,90]) hexagon(size, height);
  }
}

// size is the XY plane size, height in Z
module hexagram(size, height) {
  boxWidth=size/1.75;
  for (v = [[0,1],[0,-1],[1,-1]]) {
    intersection() {
      rotate([0,0,60*v[0]]) cube([size, boxWidth, height], true);
      rotate([0,0,60*v[1]]) cube([size, boxWidth, height], true);
    }
  }
}

module rightTriangle(adjacent, opposite, height) {
  difference() {
    translate([-adjacent/2,opposite/2,0]) cube([adjacent, opposite, height], true);
    translate([-adjacent,0,0]) {
      rotate([0,0,atan(opposite/adjacent)]) dislocateBox(adjacent*2, opposite, height+2);
    }
  }
}

module equiTriangle(side, height) {
  difference() {
    translate([-side/2,side/2,0]) cube([side, side, height], true);
    rotate([0,0,30]) dislocateBox(side*2, side, height);
    translate([-side,0,0]) {
      rotate([0,0,60]) dislocateBox(side*2, side, height);
    }
  }
}

module 12ptStar(size, height) {
  starNum = 3;
  starAngle = 360/starNum;
  for (s = [1:starNum]) {
    rotate([0, 0, s*starAngle]) cube([size, size, height], true);
  }
}

//-----------------------
//MOVES THE ROTATION AXIS OF A BOX FROM ITS CENTER TO THE BOTTOM LEFT CORNER
module dislocateBox(w, h, d) {
  translate([0,0,-d/2]) cube([w,h,d]);
}

//-----------------------
// Tests
//module test2D_ellipse(){ellipse(10, 5);}
module test_ellipsoid(){ellipsoid(10, 5);}

//module test2D_egg_outline(){egg_outline();}
// file: MCAD/boxes.scad
// Library: boxes.scad
// Version: 1.0
// Author: Marius Kintel
// Copyright: 2010
// License: BSD

// roundedBox([width, height, depth], float radius, bool sidesonly);

// EXAMPLE USAGE:
// roundedBox([20, 30, 40], 5, true);

// size is a vector [w, h, d]
module roundedBox(size, radius, sidesonly)
{
  rot = [ [0,0,0], [90,0,90], [90,90,0] ];
  if (sidesonly) {
    cube(size - [2*radius,0,0], true);
    cube(size - [0,2*radius,0], true);
    for (x = [radius-size[0]/2, -radius+size[0]/2],
           y = [radius-size[1]/2, -radius+size[1]/2]) {
      translate([x,y,0]) cylinder(r=radius, h=size[2], center=true);
    }
  }
  else {
    cube([size[0], size[1]-radius*2, size[2]-radius*2], center=true);
    cube([size[0]-radius*2, size[1], size[2]-radius*2], center=true);
    cube([size[0]-radius*2, size[1]-radius*2, size[2]], center=true);

    for (axis = [0:2]) {
      for (x = [radius-size[axis]/2, -radius+size[axis]/2],
             y = [radius-size[(axis+1)%3]/2, -radius+size[(axis+1)%3]/2]) {
        rotate(rot[axis])
          translate([x,y,0])
          cylinder(h=size[(axis+2)%3]-2*radius, r=radius, center=true);
      }
    }
    for (x = [radius-size[0]/2, -radius+size[0]/2],
           y = [radius-size[1]/2, -radius+size[1]/2],
           z = [radius-size[2]/2, -radius+size[2]/2]) {
      translate([x,y,z]) sphere(radius);
    }
  }
}
// file: MCAD/materials.scad
/*
 * Material colors.
 * 
 * Originally by Hans Häggström, 2010.
 * Dual licenced under Creative Commons Attribution-Share Alike 3.0 and LGPL2 or later
 */

// Material colors
Oak = [0.65, 0.5, 0.4];
Pine = [0.85, 0.7, 0.45];
Birch = [0.9, 0.8, 0.6];
FiberBoard = [0.7, 0.67, 0.6];
BlackPaint = [0.2, 0.2, 0.2];
Iron = [0.36, 0.33, 0.33];
Steel = [0.65, 0.67, 0.72];
Stainless = [0.45, 0.43, 0.5];
Aluminum = [0.77, 0.77, 0.8];
Brass = [0.88, 0.78, 0.5];
Transparent = [1, 1, 1, 0.2];

// Example, uncomment to view
//color_demo();

module color_demo(){
    // Wood
    colorTest(Oak, 0, 0);
    colorTest(Pine, 1, 0);
    colorTest(Birch, 2, 0);

    // Metals
    colorTest(Iron, 0, 1);
    colorTest(Steel, 1, 1);
    colorTest(Stainless, 2, 1);
    colorTest(Aluminum, 3, 1);

    // Mixboards
    colorTest(FiberBoard, 0, 2);

    // Paints
    colorTest(BlackPaint, 0, 3);
}

module colorTest(col, row=0, c=0) {
  color(col) translate([row * 30,c*30,0]) sphere(r=10);
}
// file: MCAD/units.scad
/*
 * Basic units.
 * 
 * Originally by Hans Häggström, 2010.
 * Dual licenced under Creative Commons Attribution-Share Alike 3.0 and LGPL2 or later
 */


mm = 1;
cm = 10 * mm;
dm = 100 * mm;
m = 1000 * mm;

inch = 25.4 * mm;

X = [1, 0, 0];
Y = [0, 1, 0];
Z = [0, 0, 1];

M3 = 3*mm;
M4 = 4*mm;
M5 = 5*mm;
M6 = 6*mm;
M8 = 8*mm;


// When a small distance is needed to overlap shapes for boolean cutting, etc.
epsilon = 0.01*mm;
// main file
include <MCAD/units.scad>;
include <MCAD/materials.scad>
include <MCAD/boxes.scad>;
use <MCAD/shapes.scad>;
use <MCAD/nuts_and_bolts.scad>;
use <bom.scad>;
use <vslot.scad>;
use <nemamount.scad>;
use <sensor.scad>;
use <pulley.scad>;
use <triangle.scad>;

$fn = 32;

rod_length = 500;



module pulley_mounts()
{
      
    
      translate([24.2,-22.5,48]) rotate([270,0,90+180]) pulley_mount();  
  
	
	
	
}


module vslot_cuts()
{
   
   
   translate([25,-30+18,35]) rotate([0,90,90]) vslot20x20_cutout(110);
 	
	
	
}

module show_rods()
{  
   %translate([25,-1,35]) rotate([0,90,90]) vslot20x20(rod_length);
   %translate([8,5,35]) rotate([0,90,0]) boltHole(5, length=12);
   %translate([42,5,35]) rotate([0,270,0]) boltHole(5, length=12);


  
   

}

module mini_body()
{
	pulley_mounts();	
        translate([11.5-1.5-4,-10.5,20-2]) cube([38,30,35]); // X mount vslot
	
}

module mini_cuts()
{
	vslot_cuts();
	translate([8,5,35]) rotate([0,90,0]) boltHole(5, length=12);
	translate([42,5,35]) rotate([0,270,0]) boltHole(5, length=12);
}

module mini_corner()
{   
   difference(){
	   mini_body();
           mini_cuts();
           }
   show_rods();
   
}

rotate([0,180,0]) mini_corner();
